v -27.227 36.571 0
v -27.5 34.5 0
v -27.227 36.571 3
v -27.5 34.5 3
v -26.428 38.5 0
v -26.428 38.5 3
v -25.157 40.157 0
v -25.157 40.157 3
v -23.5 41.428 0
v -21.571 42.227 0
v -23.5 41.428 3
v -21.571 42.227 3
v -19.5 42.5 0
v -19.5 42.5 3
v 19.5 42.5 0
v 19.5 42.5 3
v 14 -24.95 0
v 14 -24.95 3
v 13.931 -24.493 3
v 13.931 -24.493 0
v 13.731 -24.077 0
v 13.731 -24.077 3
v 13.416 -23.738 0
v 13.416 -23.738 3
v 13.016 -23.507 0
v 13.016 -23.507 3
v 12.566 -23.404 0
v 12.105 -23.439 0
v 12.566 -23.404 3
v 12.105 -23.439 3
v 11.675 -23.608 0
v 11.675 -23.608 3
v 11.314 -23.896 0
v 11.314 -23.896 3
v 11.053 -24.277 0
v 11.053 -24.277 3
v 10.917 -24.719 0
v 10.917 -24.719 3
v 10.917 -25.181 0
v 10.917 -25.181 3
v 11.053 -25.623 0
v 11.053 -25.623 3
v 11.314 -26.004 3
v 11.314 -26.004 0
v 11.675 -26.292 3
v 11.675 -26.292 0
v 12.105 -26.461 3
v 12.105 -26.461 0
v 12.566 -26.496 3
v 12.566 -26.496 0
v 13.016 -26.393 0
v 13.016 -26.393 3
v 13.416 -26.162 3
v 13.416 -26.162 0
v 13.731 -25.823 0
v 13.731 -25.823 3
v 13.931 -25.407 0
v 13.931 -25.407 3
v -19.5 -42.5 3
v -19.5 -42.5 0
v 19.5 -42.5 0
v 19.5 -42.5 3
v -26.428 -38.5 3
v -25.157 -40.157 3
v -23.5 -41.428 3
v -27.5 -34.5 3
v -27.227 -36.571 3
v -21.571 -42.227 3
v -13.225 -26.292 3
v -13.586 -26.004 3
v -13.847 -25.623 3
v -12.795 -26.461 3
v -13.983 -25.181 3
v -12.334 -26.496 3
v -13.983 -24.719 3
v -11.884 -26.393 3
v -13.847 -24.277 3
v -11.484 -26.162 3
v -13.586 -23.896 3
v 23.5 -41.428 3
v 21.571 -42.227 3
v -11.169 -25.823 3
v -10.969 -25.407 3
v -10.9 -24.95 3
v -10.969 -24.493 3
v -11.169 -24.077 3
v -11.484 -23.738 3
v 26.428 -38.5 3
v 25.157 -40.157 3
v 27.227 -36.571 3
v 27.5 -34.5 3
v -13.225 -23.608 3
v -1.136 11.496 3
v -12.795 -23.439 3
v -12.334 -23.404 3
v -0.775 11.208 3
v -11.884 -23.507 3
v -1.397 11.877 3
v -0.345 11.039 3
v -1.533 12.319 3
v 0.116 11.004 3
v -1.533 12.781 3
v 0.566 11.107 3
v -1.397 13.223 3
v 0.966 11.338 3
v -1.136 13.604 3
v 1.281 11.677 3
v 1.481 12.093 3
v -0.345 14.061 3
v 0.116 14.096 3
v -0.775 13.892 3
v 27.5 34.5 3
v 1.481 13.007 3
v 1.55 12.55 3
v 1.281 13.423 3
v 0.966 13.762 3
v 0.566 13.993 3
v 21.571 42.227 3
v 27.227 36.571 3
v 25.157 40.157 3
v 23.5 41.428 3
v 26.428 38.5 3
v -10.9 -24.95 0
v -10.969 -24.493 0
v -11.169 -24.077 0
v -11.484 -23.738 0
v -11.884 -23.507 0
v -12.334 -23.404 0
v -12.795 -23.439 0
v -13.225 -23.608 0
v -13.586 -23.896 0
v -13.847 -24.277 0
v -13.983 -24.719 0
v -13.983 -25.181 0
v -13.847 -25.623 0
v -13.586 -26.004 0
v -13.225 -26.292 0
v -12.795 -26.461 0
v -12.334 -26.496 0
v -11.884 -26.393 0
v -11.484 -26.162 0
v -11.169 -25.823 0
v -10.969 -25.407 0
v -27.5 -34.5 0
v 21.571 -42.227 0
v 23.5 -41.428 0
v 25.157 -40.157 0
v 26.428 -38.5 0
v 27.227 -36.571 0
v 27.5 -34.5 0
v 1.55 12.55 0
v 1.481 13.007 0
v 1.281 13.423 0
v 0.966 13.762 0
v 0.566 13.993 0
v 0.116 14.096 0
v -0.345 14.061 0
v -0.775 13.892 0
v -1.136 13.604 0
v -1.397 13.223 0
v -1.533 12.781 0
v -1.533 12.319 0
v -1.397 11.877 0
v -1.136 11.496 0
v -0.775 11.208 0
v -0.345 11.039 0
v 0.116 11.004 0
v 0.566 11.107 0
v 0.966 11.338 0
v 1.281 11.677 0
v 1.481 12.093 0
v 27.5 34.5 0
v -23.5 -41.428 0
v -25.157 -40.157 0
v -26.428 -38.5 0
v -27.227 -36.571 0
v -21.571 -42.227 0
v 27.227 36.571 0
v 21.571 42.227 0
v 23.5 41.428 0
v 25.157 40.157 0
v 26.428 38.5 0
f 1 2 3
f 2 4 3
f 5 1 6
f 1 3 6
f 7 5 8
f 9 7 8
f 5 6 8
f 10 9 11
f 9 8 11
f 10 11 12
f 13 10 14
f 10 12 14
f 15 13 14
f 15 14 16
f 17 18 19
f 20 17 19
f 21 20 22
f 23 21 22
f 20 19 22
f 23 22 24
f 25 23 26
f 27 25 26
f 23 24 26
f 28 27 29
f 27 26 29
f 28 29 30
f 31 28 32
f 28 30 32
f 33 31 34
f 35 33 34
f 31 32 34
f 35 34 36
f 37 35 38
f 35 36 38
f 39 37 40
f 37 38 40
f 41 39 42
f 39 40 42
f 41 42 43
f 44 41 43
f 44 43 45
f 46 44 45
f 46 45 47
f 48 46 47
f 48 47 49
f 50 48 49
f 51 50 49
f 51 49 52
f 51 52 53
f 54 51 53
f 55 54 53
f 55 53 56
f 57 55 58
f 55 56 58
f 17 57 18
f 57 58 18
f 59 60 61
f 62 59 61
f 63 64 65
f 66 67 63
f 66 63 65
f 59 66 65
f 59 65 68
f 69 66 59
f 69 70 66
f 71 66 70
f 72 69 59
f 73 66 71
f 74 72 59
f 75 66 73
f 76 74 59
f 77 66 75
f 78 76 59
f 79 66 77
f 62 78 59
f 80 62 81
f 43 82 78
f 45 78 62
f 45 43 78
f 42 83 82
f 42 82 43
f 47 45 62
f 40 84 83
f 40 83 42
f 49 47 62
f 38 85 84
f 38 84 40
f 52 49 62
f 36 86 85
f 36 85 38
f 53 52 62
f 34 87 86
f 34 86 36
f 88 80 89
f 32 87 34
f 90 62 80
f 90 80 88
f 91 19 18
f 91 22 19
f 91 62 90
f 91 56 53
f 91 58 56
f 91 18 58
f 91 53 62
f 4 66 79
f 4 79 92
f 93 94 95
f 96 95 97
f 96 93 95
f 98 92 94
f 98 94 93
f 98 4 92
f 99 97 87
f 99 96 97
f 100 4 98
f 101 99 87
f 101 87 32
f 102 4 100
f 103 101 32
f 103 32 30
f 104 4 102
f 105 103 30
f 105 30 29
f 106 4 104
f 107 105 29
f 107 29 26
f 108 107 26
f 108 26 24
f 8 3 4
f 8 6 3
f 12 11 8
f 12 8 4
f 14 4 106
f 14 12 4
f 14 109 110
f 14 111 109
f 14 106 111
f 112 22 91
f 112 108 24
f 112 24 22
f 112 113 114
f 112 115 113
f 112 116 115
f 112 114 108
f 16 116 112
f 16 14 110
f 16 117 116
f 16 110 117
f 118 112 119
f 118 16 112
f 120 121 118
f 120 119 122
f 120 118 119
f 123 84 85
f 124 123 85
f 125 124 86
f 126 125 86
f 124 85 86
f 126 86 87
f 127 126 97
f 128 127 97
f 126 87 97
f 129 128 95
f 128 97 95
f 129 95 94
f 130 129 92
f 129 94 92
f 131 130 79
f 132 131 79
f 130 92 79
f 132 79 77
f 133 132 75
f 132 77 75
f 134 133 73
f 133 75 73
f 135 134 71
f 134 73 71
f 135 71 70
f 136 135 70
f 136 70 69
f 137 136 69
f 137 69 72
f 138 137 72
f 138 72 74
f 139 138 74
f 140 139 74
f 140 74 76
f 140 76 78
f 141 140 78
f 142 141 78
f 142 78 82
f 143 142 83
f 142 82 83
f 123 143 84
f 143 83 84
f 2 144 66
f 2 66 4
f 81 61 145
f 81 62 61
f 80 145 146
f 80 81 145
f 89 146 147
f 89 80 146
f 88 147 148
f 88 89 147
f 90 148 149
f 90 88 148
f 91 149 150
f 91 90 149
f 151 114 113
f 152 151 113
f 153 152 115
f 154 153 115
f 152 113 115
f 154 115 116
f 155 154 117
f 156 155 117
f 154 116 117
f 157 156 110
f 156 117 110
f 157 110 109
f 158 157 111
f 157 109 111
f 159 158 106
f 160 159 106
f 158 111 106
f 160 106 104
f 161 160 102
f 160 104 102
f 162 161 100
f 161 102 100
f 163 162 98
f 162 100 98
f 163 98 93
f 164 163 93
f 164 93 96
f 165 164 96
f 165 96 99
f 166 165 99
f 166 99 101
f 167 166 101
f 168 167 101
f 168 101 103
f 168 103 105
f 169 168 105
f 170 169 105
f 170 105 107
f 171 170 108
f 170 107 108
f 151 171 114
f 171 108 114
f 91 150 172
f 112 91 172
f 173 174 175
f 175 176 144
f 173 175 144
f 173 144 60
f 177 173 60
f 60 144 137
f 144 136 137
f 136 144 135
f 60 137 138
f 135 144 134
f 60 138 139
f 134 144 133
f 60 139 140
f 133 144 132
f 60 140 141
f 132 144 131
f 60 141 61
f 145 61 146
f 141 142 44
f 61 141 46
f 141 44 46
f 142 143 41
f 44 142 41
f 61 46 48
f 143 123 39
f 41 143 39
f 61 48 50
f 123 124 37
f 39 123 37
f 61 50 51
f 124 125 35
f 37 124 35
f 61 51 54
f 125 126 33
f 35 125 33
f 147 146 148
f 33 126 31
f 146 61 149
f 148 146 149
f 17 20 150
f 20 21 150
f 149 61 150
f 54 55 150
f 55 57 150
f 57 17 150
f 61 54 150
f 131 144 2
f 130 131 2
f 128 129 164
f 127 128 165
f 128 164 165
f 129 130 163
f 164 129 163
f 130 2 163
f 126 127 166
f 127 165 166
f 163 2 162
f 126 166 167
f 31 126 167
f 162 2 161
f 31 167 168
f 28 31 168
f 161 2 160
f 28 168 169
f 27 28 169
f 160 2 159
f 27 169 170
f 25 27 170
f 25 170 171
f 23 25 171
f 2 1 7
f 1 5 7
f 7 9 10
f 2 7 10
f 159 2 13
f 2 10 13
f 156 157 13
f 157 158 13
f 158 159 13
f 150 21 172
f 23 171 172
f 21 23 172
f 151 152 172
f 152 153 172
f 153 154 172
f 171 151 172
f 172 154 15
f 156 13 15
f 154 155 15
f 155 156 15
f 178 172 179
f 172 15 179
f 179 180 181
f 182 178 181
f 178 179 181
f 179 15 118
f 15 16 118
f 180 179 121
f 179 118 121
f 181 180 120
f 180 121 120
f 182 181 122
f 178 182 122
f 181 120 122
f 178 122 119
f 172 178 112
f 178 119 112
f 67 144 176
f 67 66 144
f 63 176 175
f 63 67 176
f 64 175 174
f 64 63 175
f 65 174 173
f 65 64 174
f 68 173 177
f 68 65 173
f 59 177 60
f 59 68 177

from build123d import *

# Parameters (mm, degrees)
F0_W     = 55
F0_H     = 85
F1_DEPTH = 3
F2_R     = 1.55
F3_DEPTH = 3
F4_R     = 8


with BuildPart() as f1:
    # F0 (on Top) → F1 (new body)
    with BuildSketch(Plane.XY):
        Rectangle(F0_W, F0_H)
    extrude(amount=F1_DEPTH)

    # F2 (on face) → F3 (cut, through all)
    with BuildSketch(Plane.XY.offset(3)):
        with Locations((-12.45, -24.95)):
            Circle(F2_R)
        with Locations((12.45, -24.95)):
            Circle(F2_R)
        with Locations((0, 12.55)):
            Circle(F2_R)
    extrude(amount=-F3_DEPTH, mode=Mode.SUBTRACT)

    # F4
    f4_edges = [f1.edges().sort_by_distance(p)[0] for p in [
        (27.5, -42.5, 1.5),
        (-27.5, -42.5, 1.5),
        (-27.5, 42.5, 1.5),
        (27.5, 42.5, 1.5),
    ]]
    fillet(f4_edges, radius=F4_R)


solid = f1.part
